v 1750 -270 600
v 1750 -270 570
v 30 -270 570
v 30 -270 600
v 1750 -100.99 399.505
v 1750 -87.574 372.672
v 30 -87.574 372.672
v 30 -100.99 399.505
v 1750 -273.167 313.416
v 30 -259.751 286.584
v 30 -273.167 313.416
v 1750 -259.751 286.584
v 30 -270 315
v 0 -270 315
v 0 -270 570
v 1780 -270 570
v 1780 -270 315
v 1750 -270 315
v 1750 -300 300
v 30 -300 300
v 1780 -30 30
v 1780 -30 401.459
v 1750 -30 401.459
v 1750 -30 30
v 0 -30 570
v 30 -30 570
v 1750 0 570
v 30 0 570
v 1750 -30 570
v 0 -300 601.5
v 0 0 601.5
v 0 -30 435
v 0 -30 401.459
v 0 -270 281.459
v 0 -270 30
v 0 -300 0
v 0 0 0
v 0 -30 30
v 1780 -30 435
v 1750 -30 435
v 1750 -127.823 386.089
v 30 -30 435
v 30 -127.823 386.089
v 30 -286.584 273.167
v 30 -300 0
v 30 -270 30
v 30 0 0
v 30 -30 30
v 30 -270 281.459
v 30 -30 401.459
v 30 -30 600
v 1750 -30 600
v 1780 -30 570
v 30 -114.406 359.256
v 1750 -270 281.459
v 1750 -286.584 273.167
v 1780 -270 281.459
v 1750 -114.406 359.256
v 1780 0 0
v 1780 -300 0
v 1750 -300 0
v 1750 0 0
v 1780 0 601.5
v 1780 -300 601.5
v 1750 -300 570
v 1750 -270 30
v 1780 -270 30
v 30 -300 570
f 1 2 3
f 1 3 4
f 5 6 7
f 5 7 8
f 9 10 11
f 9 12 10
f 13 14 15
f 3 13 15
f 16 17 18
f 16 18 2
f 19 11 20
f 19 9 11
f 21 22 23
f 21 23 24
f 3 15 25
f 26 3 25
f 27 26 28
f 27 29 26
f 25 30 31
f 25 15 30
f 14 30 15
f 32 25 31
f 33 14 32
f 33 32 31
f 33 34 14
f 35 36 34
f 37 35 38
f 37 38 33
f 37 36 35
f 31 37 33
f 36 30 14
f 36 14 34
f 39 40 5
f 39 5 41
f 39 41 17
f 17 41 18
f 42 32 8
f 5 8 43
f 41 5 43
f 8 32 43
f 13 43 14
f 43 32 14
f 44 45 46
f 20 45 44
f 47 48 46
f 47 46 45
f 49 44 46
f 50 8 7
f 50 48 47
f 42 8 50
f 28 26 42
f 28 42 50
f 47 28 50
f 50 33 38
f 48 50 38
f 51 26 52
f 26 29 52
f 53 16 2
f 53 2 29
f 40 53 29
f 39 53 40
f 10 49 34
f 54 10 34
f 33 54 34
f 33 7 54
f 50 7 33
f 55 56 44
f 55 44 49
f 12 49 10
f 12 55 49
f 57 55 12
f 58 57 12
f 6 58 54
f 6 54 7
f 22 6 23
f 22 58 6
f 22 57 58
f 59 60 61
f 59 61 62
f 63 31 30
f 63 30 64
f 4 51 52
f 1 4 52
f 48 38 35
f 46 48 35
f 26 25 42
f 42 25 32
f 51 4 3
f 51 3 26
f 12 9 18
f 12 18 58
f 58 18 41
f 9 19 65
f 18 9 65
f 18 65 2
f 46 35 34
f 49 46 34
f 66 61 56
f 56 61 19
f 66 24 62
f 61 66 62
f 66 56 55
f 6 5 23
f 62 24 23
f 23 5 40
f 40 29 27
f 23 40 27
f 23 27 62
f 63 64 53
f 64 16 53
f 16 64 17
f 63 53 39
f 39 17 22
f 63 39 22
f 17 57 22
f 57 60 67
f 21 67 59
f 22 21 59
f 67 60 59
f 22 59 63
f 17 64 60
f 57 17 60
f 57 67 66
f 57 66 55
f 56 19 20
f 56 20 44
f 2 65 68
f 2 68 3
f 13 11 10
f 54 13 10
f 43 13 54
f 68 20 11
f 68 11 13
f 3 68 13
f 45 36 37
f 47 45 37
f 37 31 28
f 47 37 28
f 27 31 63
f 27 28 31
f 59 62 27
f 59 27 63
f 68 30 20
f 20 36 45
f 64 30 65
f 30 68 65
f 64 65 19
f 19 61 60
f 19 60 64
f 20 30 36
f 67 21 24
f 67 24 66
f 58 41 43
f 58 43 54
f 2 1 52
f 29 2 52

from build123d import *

# Parameters (mm, degrees)
F2_W          = 300
F2_H          = 600
F3_DEPTH      = 30
F4_W          = 300
F4_H          = 600
F5_DEPTH      = 30
F6_W          = 30
F6_H          = 30
F7_DEPTH      = 860
F7_DEPTH_BACK = 860
F8_W          = 1780
F8_H          = 300
F9_DEPTH      = 1.5


with BuildPart() as f3:
    # F2 (on Right) → F3 (new body)
    with BuildSketch(Plane.YZ):
        with Locations((-150, 300)):
            Rectangle(F2_W, F2_H)
        Polygon((-270, 30), (-270, 281.45898), (-30, 401.45898), (-30, 30), align=None, mode=Mode.SUBTRACT)
        Polygon((-30, 570), (-30, 435), (-270, 315), (-270, 570), align=None, mode=Mode.SUBTRACT)
    extrude(amount=F3_DEPTH)



with BuildPart() as f5:
    # F4 (on offset) → F5 (new body)
    with BuildSketch(Plane.YZ.offset(1780)):
        with Locations((-150, 300)):
            Rectangle(F4_W, F4_H)
        Polygon((-270, 30), (-270, 281.45898), (-30, 401.45898), (-30, 30), align=None, mode=Mode.SUBTRACT)
        Polygon((-30, 570), (-30, 435), (-270, 315), (-270, 570), align=None, mode=Mode.SUBTRACT)
    extrude(amount=-F5_DEPTH)


with BuildPart() as f3_1:
    add(f3.part)

    add(f5.part)  # F7 merges F5
    # F6 (on offset) → F7 (join, two sides)
    with BuildSketch(Plane.YZ.offset(890)) as f7_sk:
        Polygon((-273.167184, 313.416408), (-300, 300), (-286.583592, 273.167184), (-259.750776, 286.583592), align=None)
        with Locations((-15, 585)):
            Rectangle(F6_W, F6_H)
        with Locations((-285, 585)):
            Rectangle(F6_W, F6_H)
        Polygon((-100.98995, 399.505025), (-127.822766, 386.088617), (-114.406358, 359.255801), (-87.573542, 372.672209), align=None)
    extrude(amount=F7_DEPTH)
    extrude(f7_sk.sketch, amount=-F7_DEPTH_BACK)

    # F8 (on face) → F9 (join)
    with BuildSketch(Plane.XY.offset(600)):
        with Locations((890, -150)):
            Rectangle(F8_W, F8_H)
    extrude(amount=F9_DEPTH)


solid = f3_1.part
